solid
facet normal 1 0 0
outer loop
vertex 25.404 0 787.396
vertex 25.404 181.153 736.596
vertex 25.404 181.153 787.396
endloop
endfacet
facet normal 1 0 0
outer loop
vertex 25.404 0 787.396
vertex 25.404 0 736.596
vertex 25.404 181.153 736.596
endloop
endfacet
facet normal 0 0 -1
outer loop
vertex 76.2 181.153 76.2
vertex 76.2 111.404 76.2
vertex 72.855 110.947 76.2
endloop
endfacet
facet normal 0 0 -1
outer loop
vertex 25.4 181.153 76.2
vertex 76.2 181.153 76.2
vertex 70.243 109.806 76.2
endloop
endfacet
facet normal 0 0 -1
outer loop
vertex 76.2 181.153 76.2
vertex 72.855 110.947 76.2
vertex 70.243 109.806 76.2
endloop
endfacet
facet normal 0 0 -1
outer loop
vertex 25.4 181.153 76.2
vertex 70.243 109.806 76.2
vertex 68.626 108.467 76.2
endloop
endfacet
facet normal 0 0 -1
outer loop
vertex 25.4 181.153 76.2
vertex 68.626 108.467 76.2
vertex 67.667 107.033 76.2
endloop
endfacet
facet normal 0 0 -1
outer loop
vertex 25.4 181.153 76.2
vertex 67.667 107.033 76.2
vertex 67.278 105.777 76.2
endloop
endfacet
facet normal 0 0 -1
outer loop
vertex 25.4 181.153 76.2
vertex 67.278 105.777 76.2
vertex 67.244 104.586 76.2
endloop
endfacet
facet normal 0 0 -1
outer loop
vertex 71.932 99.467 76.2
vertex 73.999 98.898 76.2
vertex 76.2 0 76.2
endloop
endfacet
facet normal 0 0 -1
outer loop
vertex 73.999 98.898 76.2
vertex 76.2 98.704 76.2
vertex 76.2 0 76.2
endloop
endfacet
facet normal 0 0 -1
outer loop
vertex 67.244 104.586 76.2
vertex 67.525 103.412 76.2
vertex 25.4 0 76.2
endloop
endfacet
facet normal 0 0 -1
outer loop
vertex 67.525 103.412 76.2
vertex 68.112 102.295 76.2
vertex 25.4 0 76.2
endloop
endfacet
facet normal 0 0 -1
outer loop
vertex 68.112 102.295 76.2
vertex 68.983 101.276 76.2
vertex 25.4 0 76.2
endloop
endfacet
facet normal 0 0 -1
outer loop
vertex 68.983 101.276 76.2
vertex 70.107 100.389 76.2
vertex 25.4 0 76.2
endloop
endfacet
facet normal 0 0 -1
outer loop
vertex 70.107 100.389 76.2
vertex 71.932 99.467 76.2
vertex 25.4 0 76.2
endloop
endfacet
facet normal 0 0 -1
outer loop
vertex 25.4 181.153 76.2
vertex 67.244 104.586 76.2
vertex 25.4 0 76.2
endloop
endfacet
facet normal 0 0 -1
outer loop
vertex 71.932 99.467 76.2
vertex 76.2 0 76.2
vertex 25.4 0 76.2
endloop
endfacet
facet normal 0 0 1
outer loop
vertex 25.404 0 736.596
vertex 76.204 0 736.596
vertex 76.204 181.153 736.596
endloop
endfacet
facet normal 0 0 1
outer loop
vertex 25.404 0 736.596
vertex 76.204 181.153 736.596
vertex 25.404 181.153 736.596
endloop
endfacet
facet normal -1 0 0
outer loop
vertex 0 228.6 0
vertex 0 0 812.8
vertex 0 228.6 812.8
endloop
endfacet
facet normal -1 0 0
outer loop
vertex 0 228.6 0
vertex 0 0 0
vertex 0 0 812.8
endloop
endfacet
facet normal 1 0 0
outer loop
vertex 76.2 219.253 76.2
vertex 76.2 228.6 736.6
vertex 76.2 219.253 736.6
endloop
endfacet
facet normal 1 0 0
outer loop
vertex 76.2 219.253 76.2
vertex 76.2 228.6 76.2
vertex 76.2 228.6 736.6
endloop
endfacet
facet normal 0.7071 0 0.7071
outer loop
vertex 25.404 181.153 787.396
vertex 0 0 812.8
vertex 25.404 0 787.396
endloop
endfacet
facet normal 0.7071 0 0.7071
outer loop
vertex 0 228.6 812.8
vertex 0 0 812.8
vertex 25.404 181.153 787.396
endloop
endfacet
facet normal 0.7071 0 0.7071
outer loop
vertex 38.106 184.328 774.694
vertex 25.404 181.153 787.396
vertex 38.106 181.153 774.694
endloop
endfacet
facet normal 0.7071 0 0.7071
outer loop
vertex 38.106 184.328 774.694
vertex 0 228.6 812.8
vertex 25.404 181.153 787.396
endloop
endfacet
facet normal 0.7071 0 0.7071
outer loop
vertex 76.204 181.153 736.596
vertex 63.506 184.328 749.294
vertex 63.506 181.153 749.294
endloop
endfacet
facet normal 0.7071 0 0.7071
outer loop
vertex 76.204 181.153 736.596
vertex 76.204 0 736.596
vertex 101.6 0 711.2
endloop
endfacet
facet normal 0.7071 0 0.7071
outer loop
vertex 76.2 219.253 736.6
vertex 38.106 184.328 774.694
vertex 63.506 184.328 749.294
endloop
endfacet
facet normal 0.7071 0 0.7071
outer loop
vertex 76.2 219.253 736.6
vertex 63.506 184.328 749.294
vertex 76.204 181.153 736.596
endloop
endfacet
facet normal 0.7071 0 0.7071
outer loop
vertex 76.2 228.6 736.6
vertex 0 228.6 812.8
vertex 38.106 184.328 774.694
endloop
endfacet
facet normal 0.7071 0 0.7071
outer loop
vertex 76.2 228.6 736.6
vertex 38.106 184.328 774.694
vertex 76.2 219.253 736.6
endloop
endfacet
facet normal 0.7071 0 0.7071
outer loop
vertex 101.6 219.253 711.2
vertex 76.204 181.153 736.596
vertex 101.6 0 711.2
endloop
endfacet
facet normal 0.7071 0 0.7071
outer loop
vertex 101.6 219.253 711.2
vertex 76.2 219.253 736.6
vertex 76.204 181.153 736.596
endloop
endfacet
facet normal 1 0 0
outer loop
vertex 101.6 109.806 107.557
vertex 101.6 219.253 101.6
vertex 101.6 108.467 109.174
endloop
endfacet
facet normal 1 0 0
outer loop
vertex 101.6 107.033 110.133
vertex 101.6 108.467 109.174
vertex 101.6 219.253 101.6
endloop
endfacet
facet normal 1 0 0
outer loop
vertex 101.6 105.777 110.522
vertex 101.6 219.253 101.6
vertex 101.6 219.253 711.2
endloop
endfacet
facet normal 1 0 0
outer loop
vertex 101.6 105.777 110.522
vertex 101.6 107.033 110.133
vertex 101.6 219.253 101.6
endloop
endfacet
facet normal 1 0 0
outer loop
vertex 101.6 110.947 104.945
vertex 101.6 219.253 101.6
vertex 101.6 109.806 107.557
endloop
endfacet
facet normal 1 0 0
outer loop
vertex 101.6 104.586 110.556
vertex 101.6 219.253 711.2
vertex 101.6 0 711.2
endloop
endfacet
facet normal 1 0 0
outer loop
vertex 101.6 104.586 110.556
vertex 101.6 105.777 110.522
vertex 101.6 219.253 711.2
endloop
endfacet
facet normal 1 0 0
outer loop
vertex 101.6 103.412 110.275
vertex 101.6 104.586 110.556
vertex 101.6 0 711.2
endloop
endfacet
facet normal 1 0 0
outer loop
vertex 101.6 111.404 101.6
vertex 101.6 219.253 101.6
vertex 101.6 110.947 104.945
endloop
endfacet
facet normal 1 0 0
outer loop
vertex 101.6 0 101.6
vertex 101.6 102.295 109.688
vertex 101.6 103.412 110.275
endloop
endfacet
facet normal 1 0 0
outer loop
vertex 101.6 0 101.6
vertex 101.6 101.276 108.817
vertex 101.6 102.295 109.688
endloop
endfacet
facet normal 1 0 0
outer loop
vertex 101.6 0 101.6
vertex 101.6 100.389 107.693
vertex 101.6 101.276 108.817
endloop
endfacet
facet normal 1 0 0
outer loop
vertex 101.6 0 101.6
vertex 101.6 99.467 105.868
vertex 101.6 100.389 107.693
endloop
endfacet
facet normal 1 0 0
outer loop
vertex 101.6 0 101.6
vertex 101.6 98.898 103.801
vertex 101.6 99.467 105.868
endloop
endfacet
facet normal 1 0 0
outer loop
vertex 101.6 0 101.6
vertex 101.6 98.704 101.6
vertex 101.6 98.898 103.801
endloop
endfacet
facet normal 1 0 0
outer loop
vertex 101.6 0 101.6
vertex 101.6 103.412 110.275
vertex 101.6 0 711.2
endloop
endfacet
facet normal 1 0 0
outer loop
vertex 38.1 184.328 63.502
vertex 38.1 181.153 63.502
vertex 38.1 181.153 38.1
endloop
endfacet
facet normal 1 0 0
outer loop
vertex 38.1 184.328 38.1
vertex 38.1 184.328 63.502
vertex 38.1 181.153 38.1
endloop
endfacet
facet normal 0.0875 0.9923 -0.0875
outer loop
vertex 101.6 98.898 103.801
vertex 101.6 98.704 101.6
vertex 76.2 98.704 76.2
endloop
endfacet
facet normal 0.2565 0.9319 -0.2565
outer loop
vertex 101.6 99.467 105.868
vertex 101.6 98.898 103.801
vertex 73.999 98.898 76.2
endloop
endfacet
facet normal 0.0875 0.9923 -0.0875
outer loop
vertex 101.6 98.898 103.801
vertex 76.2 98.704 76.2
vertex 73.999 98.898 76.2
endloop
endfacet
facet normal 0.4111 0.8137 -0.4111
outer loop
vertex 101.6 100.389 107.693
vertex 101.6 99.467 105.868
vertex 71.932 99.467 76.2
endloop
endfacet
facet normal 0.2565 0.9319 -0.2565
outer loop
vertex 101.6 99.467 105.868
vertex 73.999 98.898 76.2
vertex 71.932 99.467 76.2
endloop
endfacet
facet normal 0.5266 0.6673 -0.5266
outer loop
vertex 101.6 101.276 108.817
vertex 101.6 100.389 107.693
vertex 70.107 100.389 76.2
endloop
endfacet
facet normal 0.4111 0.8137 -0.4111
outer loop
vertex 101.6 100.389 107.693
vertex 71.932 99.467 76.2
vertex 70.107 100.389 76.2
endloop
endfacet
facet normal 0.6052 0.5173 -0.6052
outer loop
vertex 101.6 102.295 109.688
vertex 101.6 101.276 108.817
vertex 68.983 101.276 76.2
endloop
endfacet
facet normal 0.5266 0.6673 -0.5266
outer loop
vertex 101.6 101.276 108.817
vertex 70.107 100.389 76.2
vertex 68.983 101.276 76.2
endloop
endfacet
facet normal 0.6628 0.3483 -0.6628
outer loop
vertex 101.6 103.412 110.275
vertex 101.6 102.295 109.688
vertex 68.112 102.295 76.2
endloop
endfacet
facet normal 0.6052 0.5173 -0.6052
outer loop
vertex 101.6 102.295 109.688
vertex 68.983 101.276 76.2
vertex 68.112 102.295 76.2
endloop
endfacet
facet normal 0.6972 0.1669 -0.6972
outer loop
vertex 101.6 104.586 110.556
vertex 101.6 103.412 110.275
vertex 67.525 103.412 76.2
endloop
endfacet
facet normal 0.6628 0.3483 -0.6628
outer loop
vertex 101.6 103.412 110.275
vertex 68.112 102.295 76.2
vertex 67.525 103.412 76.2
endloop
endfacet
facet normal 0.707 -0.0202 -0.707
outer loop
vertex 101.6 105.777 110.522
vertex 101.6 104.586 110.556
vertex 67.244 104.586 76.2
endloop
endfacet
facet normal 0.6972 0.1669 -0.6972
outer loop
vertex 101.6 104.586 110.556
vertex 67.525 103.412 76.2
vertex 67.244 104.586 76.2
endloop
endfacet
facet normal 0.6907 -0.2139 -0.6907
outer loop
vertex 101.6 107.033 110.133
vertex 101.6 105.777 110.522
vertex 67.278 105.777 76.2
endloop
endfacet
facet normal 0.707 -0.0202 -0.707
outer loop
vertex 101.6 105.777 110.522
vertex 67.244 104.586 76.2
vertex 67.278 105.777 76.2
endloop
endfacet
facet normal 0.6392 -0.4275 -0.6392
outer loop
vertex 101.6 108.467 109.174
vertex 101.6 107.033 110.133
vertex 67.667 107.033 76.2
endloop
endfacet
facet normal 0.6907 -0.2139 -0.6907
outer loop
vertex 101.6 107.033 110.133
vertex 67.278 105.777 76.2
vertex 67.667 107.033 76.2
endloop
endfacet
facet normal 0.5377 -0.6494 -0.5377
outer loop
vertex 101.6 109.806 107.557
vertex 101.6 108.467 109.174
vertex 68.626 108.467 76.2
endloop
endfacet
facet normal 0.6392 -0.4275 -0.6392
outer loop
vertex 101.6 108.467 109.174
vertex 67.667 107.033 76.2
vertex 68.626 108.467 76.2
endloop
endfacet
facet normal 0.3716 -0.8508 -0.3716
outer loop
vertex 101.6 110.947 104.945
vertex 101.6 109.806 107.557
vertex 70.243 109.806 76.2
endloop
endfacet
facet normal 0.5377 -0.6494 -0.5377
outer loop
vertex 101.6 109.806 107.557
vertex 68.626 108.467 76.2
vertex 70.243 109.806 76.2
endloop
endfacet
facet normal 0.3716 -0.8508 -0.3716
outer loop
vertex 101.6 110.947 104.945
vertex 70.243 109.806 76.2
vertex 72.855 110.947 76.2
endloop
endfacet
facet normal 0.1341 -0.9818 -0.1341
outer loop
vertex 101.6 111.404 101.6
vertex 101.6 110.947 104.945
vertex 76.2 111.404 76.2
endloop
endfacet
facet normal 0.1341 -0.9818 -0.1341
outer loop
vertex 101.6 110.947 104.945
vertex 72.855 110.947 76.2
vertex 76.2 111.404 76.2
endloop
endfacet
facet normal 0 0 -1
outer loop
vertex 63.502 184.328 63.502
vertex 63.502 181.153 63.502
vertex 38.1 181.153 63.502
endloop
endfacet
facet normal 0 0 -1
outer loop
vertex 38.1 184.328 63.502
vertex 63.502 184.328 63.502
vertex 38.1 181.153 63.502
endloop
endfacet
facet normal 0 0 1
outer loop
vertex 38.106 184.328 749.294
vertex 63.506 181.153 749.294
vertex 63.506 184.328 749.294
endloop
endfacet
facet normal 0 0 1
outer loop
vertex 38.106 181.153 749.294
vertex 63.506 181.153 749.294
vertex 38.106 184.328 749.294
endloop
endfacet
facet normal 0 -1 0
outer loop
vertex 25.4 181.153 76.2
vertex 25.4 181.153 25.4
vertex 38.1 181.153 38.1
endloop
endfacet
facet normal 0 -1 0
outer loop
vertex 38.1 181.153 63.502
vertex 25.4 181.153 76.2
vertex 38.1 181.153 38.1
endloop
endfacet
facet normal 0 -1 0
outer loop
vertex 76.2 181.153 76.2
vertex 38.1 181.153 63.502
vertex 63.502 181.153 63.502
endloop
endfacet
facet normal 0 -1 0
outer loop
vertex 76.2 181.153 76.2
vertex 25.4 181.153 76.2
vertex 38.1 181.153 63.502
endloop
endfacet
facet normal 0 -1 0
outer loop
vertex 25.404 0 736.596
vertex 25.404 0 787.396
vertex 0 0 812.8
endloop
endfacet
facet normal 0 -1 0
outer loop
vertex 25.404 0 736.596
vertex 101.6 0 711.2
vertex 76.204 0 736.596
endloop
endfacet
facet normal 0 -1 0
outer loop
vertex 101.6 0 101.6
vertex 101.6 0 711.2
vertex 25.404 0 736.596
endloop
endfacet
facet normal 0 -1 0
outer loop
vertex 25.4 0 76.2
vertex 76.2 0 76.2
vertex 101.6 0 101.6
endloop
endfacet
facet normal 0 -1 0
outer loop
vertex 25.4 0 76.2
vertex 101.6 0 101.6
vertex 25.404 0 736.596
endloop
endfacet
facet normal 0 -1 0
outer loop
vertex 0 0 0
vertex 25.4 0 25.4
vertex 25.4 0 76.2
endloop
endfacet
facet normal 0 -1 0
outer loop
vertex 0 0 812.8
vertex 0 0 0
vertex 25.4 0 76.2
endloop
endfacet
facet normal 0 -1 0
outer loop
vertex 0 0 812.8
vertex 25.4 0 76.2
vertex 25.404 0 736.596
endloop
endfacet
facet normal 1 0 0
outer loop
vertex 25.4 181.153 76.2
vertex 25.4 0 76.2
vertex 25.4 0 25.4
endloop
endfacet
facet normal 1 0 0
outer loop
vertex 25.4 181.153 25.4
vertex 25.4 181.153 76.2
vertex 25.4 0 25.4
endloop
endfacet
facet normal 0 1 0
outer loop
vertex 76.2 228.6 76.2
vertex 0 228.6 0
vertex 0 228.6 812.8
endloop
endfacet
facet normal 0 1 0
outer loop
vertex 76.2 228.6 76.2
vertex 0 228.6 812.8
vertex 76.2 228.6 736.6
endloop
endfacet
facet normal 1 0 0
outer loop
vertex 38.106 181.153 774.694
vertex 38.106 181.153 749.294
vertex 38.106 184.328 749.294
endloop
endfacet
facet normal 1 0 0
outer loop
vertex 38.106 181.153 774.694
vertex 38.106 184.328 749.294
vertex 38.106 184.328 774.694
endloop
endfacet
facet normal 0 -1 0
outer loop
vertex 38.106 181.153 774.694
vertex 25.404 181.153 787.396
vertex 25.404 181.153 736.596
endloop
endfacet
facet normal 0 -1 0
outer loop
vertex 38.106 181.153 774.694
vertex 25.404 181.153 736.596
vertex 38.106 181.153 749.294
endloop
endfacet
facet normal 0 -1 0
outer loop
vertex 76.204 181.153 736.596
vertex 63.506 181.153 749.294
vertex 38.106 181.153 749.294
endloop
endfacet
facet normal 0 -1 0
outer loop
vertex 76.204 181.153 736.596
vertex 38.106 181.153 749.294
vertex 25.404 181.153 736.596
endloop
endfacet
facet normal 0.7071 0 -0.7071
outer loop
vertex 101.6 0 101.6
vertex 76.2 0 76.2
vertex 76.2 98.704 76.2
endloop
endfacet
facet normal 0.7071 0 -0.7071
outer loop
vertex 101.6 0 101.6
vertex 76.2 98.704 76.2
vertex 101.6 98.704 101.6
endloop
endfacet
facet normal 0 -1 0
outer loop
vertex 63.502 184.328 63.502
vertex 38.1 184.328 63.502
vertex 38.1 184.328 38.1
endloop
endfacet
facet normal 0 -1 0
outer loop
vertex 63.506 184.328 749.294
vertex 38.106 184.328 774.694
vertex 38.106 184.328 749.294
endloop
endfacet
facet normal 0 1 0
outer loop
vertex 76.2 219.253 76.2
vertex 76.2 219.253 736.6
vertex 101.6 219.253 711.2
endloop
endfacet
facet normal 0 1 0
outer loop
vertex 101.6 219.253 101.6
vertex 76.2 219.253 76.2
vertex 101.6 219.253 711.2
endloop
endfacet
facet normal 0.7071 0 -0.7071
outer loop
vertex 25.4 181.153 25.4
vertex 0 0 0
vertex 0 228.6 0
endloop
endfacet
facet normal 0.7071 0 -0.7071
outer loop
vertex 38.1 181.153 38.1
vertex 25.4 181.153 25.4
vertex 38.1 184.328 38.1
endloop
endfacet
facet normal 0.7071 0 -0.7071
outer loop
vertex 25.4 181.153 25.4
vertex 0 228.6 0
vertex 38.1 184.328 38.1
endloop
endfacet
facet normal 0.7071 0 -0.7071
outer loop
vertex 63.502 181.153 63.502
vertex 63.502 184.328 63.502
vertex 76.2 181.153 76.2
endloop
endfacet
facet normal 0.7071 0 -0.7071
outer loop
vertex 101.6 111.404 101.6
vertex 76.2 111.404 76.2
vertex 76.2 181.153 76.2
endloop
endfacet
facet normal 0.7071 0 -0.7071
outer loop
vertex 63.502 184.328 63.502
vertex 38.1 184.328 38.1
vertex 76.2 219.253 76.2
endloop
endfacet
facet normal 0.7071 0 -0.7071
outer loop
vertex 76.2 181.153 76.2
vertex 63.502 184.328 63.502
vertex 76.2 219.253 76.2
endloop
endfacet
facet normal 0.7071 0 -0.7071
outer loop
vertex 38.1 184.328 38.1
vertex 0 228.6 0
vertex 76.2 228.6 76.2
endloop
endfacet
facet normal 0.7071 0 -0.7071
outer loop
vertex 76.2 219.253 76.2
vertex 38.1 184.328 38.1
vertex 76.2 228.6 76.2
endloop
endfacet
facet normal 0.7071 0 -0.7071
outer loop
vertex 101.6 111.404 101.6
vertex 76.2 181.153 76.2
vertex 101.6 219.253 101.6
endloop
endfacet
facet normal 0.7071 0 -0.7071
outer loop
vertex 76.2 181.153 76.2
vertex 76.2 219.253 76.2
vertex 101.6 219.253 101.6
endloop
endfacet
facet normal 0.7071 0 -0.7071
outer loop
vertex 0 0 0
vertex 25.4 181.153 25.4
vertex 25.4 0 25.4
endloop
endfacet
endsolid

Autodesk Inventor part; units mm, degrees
ref_plane "YZ Plane" through (0, 0, 0) normal (1, 0, 0) x (0, 1, 0)
ref_plane "XZ Plane" through (0, 0, 0) normal (0, 1, 0) x (-1, 0, 0)
sketch "Sketch1" plane through (0, 0, 0) normal (0, 0, 1) x (1, 0, 0)
  line L0 (0, 0) -> (0, 228.6)
  line L1 (0, 228.6) -> (76.2, 228.6)
  line L2 (76.2, 228.6) -> (76.2, 219.2528)
  line L3 (76.2, 219.2528) -> (101.6, 219.2528)
  line L4 (101.6, 219.2528) -> (101.6, 0)
  line L5 (101.6, 0) -> (0, 0)
  dimension "d0" = 228.6
  dimension "d1" = 76.2
  dimension "d2" = 9.3472
  dimension "d3" = 25.4
extrude "Extrusion1" add sketch "Sketch1" along normal blind 812.8
sketch "Sketch6" plane through (0, 0, 0) normal (0, -1, 0) x (1, 0, 0)
  line L0 (101.6, 0) -> (101.6, 812.8) projected
  line L1 (0, 812.8) -> (101.6, 711.2) projected
  line L2 (76.2038, 736.5962) -> (25.4038, 736.5962)
  line L3 (25.4038, 736.5962) -> (25.4038, 787.3962)
  line L4 (25.4038, 787.3962) -> (76.2, 736.6)
  point P0 (0, 0)
  point P1 (101.6, 101.6)
  dimension "d31" = 35.9156
  dimension "d32" = 50.8
  dimension "d33" = 50.8
extrude "Extrusion4" cut sketch "Sketch6" against normal blind 181.1528
sketch "Sketch7" plane through (25.4038, 0, 736.5962) normal (0, -1, 0) x (1, 0, 0)
  line L0 (76.1962, -634.9962) -> (50.7962, -660.3962)
  line L1 (50.7962, -660.3962) -> (-0.0038, -660.3962)
  line L2 (76.1962, -634.9962) -> (-25.4038, -736.5962) projected
  line L3 (76.1962, -736.5962) -> (76.1962, 76.2038) projected
  line L4 (-0.0038, -660.3962) -> (-0.0038, -711.1962)
  line L5 (-0.0038, -711.1962) -> (50.7962, -660.3962)
  point P0 (76.1962, -25.3962)
  dimension "d39" = 50.8
  dimension "d41" = 90
  dimension "d42" = 50.8
extrude "Extrusion5" cut sketch "Sketch7" against normal blind 181.1528
chamfer "Chamfer5" distance 101.6 angle 45 1 edges at (101.6, 109.6264, 812.8)
chamfer "Chamfer6" distance 101.6 angle 45 1 edges at (101.6, 109.6264, 0)
ref_plane "Work Plane3" through (137.521, 56.9702, 137.521) normal (0.7071068, 0, 0.7071068) x (0, -1, 0)
sketch "Sketch9" plane through (137.521, 56.9702, 137.521) normal (0.7071068, 0, 0.7071068) x (0, -1, 0)
  line L0 (-162.2826, 0) -> (-162.2826, -466.9733) projected
  line L1 (-162.2826, 0) -> (-48.0842, 0)
  line L2 (-162.2826, 0) -> (56.9702, 0) projected
  dimension "d65" = 114.1984
hole "Hole2" at (137.521, 105.0544, 137.521) direction (-0.7071068, 0, -0.7071068) diameter 12.7 depth 127 tip angle 118
sketch "Sketch10" plane through (0, 181.1528, 0) normal (0, -1, 0) x (1, 0, 0)
  line L0 (76.2, 76.2) -> (76.2, 736.6) projected
  line L1 (76.2, 76.2) -> (63.5019, 63.5019)
  line L2 (0, 0) -> (76.2, 76.2) projected
  line L3 (63.5019, 63.5019) -> (38.1019, 63.5019)
  line L4 (38.1019, 63.5019) -> (38.1019, 38.1019)
  line L5 (63.5019, 63.5019) -> (38.1019, 38.1019)
  line L6 (76.2038, 736.5962) -> (63.5058, 749.2942)
  line L7 (63.5058, 749.2942) -> (38.1058, 749.2942)
  line L8 (38.1058, 749.2942) -> (38.1058, 774.6942)
  line L9 (63.5058, 749.2942) -> (38.1058, 774.6942)
  dimension "d73" = 17.9578
  dimension "d74" = 25.4
  dimension "d75" = 17.9578
  dimension "d76" = 25.4
extrude "Extrusion6" cut sketch "Sketch10" against normal blind 3.175 contours L7 L8 L9
sketch "Sketch11" plane through (25.4038, 181.1528, 736.5962) normal (0, -1, 0) x (1, 0, 0)
  line L0 (50.7962, -660.3962) -> (38.0981, -673.0942)
  line L1 (38.0981, -673.0942) -> (12.6962, -673.0942)
  line L2 (12.6962, -673.0942) -> (12.6962, -698.4962)
  line L3 (38.0981, -673.0942) -> (12.6962, -698.4962)
  line L4 (-25.4038, -736.5962) -> (50.7962, -660.3962) projected
  dimension "d79" = 17.9578
  dimension "d80" = 180
  dimension "d81" = 25.4019
  dimension "d82" = 25.4019
extrude "Extrusion7" cut sketch "Sketch11" against normal blind 3.175
properties part number "SideWidthOutlet" material "Wood (Birch)"
